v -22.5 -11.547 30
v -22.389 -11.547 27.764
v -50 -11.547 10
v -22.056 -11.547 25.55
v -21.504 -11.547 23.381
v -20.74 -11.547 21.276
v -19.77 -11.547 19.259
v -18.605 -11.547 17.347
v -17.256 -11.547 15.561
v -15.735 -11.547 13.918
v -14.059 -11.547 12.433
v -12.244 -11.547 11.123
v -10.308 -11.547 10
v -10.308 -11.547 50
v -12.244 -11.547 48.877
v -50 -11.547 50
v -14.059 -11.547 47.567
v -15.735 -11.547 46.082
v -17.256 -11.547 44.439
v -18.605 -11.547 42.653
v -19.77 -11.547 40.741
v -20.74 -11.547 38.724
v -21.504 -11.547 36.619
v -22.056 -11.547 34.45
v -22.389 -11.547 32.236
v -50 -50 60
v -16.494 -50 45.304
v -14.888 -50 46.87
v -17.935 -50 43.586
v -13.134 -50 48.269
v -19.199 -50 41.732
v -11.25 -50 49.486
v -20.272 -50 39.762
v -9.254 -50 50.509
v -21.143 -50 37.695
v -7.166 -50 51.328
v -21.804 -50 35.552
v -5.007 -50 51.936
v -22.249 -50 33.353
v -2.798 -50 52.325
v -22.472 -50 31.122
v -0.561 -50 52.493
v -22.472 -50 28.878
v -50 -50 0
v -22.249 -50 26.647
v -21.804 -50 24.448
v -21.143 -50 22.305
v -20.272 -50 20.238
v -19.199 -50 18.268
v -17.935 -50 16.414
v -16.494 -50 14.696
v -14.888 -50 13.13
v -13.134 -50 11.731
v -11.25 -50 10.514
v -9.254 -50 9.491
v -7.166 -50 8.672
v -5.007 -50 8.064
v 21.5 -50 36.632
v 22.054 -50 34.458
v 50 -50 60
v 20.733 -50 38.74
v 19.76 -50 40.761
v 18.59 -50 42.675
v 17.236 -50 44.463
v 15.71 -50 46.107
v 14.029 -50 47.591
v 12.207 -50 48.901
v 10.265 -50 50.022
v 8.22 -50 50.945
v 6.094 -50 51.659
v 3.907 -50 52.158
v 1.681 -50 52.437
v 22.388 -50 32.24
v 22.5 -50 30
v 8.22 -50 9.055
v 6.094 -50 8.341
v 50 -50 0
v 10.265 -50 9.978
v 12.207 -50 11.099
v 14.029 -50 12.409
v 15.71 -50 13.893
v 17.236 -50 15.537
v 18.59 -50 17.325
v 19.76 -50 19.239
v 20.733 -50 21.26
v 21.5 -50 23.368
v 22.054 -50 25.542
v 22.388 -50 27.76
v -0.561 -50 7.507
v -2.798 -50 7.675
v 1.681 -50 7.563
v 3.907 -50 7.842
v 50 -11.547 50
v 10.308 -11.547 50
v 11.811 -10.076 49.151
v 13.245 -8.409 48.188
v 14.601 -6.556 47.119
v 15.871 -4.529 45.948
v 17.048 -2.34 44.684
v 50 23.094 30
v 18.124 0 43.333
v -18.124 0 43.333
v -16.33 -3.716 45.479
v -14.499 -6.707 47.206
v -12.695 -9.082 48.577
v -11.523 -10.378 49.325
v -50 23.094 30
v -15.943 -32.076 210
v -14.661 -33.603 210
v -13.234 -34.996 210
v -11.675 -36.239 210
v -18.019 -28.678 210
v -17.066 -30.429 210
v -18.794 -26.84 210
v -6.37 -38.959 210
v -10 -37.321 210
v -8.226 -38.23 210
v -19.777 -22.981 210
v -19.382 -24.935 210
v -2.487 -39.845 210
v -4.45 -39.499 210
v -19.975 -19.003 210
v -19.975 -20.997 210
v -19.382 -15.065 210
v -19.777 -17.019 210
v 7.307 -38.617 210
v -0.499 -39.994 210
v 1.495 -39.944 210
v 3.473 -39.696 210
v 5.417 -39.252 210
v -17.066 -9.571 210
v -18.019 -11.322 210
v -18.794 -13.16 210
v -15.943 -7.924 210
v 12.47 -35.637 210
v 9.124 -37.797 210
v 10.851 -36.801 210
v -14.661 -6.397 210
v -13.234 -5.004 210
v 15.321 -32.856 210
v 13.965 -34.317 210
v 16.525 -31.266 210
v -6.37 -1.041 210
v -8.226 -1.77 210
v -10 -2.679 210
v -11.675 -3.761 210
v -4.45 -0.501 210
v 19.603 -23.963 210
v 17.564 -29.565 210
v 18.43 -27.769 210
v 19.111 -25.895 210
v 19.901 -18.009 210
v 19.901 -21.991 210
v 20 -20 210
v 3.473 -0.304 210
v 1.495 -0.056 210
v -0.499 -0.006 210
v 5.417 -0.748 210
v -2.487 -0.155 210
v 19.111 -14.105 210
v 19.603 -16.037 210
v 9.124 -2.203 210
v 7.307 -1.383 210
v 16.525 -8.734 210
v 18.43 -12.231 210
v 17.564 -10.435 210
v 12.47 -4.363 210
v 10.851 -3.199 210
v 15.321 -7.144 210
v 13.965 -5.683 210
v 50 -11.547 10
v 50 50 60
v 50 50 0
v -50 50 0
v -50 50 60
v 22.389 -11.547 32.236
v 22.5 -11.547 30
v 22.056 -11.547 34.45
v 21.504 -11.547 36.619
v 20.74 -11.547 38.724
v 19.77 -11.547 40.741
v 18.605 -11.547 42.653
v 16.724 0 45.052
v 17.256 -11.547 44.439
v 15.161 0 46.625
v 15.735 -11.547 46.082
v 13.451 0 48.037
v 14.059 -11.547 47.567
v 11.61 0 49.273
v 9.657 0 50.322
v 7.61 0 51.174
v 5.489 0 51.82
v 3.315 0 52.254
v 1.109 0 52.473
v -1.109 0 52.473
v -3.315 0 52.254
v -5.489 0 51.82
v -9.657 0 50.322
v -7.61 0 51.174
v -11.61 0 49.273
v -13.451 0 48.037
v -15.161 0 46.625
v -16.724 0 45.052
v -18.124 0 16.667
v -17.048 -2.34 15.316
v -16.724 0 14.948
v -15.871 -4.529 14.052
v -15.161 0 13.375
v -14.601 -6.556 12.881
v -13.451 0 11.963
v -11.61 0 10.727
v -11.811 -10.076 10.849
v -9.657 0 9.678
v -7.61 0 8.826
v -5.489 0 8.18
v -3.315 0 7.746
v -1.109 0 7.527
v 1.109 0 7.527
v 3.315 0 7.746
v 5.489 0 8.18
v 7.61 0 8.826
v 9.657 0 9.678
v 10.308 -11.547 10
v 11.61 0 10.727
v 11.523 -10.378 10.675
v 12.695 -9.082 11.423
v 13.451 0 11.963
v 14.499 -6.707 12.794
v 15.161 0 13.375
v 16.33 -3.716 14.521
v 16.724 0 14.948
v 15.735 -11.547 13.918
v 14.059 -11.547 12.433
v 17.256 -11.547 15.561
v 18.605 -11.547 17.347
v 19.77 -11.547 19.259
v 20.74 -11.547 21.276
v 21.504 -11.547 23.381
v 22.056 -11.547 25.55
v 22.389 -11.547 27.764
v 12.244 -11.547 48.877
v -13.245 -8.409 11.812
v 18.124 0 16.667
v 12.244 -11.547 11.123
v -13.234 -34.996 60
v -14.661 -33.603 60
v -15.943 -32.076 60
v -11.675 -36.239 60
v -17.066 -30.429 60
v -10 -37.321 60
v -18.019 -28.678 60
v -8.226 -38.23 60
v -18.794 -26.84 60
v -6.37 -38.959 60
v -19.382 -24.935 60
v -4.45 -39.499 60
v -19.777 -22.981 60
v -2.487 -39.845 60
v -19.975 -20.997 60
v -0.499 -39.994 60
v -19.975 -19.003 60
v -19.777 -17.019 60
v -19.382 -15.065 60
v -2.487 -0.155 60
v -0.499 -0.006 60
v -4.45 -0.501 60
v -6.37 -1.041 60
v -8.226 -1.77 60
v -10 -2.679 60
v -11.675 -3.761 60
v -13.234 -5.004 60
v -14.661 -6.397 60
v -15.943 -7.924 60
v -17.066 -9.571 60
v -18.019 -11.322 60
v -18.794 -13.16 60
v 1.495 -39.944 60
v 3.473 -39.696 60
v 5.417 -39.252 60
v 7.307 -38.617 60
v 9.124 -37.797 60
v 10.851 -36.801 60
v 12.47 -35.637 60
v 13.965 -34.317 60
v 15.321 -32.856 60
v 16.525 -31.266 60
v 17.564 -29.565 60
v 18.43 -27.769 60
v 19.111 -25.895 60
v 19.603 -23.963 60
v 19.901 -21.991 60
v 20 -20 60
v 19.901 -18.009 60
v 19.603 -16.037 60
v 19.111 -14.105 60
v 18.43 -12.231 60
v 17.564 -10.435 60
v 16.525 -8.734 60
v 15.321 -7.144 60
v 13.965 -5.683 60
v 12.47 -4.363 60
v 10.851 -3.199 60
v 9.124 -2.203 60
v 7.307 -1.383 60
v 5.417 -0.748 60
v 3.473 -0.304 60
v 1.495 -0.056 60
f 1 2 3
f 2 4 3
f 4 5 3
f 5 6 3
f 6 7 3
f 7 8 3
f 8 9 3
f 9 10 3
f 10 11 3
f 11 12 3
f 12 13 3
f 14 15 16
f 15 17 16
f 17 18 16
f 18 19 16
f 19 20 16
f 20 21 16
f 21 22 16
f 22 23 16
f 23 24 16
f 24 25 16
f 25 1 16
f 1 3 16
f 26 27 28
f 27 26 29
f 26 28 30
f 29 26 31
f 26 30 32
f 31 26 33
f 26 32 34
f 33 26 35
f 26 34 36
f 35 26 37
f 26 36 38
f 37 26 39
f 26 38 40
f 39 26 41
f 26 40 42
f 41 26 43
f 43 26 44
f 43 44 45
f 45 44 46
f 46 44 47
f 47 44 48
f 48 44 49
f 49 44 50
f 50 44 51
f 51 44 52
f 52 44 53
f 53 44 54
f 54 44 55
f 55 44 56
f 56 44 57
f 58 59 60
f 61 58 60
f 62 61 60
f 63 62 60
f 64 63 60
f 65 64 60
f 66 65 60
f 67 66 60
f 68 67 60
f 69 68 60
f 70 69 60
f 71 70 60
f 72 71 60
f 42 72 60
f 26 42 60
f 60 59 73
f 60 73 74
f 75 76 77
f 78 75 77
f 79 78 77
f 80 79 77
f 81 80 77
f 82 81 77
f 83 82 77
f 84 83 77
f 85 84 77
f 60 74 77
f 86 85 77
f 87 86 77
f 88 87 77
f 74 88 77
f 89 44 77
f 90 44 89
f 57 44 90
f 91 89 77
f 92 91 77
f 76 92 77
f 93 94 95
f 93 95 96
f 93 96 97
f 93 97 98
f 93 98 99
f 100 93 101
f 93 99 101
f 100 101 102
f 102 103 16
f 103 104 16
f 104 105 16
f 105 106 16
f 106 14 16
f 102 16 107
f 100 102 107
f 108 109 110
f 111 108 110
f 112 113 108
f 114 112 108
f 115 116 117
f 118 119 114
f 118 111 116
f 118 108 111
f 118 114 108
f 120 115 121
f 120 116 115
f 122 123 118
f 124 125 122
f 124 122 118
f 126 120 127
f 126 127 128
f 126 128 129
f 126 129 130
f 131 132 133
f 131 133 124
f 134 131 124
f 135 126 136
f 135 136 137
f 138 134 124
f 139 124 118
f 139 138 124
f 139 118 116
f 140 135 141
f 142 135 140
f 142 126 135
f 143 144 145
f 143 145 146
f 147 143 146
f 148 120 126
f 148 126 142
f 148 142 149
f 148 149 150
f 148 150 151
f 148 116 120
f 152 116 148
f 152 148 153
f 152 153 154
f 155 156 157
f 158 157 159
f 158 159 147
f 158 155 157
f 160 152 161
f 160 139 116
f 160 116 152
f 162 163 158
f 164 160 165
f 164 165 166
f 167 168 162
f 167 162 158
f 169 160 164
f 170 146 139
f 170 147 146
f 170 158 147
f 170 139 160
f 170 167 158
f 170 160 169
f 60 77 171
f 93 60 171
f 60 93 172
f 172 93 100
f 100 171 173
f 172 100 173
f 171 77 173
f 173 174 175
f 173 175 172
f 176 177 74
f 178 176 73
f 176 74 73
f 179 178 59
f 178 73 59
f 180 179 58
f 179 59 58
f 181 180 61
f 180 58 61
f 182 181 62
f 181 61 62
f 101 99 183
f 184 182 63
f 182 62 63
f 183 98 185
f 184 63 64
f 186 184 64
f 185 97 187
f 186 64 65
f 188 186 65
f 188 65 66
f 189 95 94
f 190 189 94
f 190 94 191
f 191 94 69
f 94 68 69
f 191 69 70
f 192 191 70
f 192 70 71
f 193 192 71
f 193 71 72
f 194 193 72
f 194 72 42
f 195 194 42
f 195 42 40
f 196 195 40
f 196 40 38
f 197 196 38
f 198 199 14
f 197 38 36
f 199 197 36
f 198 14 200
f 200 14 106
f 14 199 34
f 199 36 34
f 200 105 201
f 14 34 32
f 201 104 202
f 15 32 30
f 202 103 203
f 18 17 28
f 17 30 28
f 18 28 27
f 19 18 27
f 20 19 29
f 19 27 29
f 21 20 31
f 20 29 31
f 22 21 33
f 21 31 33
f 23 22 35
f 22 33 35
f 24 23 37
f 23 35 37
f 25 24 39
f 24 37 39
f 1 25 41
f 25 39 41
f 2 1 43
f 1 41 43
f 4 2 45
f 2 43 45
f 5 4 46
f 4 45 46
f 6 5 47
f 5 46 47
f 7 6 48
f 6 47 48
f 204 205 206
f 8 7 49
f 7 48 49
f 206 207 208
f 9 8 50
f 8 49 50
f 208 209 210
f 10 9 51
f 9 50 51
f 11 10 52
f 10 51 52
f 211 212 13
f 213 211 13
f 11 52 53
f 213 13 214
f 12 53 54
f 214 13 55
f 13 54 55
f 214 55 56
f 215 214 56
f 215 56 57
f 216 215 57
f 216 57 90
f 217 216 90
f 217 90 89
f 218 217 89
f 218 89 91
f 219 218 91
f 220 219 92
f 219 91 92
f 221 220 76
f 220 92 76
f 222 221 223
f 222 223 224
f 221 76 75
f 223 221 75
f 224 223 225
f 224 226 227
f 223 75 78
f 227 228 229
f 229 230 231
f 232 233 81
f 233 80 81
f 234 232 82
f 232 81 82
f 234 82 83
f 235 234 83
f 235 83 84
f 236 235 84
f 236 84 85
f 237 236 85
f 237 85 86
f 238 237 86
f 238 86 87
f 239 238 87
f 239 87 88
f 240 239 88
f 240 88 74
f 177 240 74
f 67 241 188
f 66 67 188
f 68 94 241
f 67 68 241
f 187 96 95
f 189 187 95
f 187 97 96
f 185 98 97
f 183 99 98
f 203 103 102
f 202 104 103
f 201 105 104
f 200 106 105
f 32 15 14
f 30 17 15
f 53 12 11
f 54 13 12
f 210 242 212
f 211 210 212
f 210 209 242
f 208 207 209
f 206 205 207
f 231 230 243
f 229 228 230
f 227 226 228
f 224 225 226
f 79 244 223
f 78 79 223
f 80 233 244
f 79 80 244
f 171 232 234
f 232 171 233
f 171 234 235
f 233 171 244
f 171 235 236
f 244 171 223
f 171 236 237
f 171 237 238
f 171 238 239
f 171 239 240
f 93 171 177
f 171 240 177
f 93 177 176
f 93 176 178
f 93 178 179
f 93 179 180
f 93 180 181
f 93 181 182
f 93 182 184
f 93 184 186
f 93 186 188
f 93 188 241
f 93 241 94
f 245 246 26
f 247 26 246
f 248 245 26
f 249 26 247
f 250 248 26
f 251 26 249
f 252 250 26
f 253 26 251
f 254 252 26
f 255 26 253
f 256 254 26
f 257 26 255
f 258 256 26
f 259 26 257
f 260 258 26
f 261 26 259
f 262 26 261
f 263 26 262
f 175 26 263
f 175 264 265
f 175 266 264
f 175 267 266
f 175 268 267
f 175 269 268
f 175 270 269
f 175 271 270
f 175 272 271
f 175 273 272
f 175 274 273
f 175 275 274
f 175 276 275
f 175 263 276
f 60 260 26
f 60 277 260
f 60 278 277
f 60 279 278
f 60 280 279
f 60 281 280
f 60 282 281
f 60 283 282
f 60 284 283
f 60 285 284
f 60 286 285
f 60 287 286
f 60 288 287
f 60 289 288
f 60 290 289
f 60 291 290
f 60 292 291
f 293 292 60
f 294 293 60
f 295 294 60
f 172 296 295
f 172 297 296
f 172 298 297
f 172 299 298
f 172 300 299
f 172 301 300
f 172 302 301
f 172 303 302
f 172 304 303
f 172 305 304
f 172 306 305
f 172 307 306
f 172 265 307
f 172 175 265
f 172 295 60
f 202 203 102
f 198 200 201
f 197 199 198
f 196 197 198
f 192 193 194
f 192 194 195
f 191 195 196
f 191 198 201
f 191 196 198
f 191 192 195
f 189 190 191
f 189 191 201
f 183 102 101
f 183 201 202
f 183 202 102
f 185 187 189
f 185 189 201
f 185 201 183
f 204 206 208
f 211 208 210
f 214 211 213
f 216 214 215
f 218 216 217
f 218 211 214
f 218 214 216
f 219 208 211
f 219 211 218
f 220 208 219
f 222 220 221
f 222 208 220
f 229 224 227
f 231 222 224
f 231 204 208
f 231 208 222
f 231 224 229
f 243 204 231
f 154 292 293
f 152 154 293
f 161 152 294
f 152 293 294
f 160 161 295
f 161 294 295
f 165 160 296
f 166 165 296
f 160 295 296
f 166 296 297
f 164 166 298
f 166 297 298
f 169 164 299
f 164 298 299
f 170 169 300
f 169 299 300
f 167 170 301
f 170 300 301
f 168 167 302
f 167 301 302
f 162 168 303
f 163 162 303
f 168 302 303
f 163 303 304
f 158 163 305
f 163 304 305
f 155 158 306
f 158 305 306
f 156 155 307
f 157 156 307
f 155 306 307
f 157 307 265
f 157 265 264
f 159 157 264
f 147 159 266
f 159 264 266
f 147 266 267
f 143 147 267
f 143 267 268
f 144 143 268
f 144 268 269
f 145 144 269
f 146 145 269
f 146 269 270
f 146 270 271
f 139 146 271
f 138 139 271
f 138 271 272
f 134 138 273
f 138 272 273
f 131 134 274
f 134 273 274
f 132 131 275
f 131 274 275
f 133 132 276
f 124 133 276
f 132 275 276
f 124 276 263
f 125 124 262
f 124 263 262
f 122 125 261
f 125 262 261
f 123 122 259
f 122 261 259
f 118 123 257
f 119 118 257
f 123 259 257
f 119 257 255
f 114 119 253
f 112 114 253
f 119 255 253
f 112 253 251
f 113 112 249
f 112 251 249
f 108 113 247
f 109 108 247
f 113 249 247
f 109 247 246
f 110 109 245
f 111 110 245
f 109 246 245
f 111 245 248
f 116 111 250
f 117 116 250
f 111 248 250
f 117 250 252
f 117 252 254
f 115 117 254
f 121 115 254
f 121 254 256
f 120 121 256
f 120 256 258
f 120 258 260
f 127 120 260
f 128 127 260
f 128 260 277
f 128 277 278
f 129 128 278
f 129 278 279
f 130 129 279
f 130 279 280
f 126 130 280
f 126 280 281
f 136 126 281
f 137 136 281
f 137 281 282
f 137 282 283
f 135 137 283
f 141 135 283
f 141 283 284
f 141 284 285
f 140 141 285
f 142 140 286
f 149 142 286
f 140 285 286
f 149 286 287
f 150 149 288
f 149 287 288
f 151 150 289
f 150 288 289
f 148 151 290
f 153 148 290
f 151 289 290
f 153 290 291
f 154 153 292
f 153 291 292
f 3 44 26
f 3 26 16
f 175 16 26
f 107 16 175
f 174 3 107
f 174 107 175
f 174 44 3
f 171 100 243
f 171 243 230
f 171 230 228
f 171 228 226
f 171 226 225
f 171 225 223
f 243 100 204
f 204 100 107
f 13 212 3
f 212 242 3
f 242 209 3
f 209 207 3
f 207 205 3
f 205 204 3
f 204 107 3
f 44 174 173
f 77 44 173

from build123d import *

# Parameters (mm, degrees)
F0_W     = 100
F0_H     = 100
F1_DEPTH = 60
F2_R     = 20
F3_DEPTH = 150
F5_DEPTH = 100
F6_R     = 22.5
F7_DEPTH = 50


with BuildPart() as f1:
    # F0 (on Top) → F1 (new body)
    with BuildSketch(Plane.XY):
        Rectangle(F0_W, F0_H)
    extrude(amount=F1_DEPTH)

    # F2 (on face) → F3 (join)
    with BuildSketch(Plane.XY.offset(60)):
        with Locations((0, -20)):
            Circle(F2_R)
    extrude(amount=F3_DEPTH)

    # F4 (on face) → F5 (cut)
    with BuildSketch(Plane(origin=(-50, 0, 0), x_dir=(0, -1, 0), z_dir=(-1, 0, 0))):
        Polygon((-23.094011, 30), (11.547005, 10), (11.547005, 50), align=None)
    extrude(amount=-F5_DEPTH, mode=Mode.SUBTRACT)

    # F6 (on face) → F7 (cut)
    with BuildSketch(Plane.XZ.offset(50)):
        with Locations((0, 30)):
            Circle(F6_R)
    extrude(amount=-F7_DEPTH, mode=Mode.SUBTRACT)


solid = f1.part
